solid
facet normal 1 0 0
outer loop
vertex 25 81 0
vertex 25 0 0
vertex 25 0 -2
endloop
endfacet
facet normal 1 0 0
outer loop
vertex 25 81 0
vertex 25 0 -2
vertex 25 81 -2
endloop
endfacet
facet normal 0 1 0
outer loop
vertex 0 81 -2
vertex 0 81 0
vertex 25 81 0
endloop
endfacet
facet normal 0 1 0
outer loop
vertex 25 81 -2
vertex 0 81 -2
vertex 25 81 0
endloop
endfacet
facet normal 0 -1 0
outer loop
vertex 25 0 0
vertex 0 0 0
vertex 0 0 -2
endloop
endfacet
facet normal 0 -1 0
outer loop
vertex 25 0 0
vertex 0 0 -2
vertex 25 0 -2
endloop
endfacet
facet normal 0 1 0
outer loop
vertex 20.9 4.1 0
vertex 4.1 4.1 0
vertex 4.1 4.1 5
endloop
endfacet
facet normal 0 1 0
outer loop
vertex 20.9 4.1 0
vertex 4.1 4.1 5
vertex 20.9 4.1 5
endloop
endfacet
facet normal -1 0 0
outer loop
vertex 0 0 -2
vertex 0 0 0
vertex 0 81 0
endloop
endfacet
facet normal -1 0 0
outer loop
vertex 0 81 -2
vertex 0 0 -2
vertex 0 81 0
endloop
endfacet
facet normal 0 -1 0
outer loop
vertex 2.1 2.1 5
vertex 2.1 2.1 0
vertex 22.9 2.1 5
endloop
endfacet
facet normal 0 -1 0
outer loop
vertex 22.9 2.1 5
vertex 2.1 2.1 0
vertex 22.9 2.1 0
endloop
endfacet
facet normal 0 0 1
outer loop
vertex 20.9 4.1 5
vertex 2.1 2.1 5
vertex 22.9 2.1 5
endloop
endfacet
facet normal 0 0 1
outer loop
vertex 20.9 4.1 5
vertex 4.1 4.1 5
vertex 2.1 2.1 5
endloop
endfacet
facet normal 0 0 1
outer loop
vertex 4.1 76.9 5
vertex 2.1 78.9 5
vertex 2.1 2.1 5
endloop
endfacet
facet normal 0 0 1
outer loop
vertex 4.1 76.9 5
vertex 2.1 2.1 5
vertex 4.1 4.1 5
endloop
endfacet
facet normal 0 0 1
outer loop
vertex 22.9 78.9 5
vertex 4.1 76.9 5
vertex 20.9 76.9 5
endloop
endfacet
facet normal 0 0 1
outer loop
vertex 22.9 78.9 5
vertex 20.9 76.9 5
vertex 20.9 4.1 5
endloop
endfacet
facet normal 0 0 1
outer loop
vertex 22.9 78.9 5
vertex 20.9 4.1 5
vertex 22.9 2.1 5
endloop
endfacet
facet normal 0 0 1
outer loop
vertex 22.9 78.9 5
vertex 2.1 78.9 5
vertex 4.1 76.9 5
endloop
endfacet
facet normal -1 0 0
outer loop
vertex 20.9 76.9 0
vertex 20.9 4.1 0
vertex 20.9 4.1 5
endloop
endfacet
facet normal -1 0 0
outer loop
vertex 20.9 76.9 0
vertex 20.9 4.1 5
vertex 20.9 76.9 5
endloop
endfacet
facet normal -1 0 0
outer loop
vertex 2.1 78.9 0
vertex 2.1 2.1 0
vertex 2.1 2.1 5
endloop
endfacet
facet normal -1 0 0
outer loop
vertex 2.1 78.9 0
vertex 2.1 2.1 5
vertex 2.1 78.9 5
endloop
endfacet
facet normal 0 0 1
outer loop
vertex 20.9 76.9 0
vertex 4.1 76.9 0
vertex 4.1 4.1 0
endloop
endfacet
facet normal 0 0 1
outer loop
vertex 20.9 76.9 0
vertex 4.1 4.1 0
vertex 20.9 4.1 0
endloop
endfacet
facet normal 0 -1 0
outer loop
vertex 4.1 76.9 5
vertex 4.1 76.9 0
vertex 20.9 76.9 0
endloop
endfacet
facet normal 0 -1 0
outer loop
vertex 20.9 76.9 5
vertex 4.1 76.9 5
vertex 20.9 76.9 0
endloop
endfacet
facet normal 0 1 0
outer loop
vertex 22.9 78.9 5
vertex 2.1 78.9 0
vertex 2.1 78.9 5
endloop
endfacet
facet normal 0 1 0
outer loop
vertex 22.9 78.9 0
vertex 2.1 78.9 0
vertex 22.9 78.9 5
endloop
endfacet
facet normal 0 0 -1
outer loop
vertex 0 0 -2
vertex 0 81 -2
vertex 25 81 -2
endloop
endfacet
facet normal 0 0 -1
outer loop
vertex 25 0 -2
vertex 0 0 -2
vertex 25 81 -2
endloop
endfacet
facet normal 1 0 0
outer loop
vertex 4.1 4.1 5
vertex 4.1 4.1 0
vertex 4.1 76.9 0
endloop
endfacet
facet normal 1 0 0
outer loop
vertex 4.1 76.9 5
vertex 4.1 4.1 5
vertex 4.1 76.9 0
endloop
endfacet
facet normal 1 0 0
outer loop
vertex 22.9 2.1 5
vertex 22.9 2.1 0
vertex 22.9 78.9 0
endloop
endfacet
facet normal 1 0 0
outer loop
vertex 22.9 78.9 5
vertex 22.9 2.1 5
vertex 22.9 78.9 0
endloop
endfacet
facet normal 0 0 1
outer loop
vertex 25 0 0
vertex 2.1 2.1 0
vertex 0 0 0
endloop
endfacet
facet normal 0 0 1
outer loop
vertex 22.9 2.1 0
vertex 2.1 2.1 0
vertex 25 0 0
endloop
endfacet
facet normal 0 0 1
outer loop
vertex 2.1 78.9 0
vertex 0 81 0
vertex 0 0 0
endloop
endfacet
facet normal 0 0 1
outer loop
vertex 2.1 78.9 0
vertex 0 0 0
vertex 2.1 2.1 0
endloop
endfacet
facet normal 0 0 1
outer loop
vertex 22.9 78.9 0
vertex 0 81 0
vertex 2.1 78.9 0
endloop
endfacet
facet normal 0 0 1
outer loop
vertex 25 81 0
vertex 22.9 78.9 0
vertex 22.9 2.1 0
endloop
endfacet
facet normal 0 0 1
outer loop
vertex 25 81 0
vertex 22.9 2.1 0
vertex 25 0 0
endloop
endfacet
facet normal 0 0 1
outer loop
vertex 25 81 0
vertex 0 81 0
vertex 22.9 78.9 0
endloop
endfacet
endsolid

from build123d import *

# Parameters (mm, degrees)
F0_W     = 25
F0_H     = 81
F1_DEPTH = 2
F2_W     = 20.8
F2_H     = 76.8
F2_W_2   = 16.8
F2_H_2   = 72.8
F3_DEPTH = 5


with BuildPart() as f1:
    # F0 (on Top) → F1 (new body)
    with BuildSketch(Plane.XY):
        with Locations((12.5, 40.5)):
            Rectangle(F0_W, F0_H)
    extrude(amount=-F1_DEPTH)

    # F2 (on Top) → F3 (join)
    with BuildSketch(Plane.XY):
        with Locations((12.5, 40.5)):
            Rectangle(F2_W, F2_H)
        with Locations((12.5, 40.5)):
            Rectangle(F2_W_2, F2_H_2, mode=Mode.SUBTRACT)
    extrude(amount=F3_DEPTH)


solid = f1.part
